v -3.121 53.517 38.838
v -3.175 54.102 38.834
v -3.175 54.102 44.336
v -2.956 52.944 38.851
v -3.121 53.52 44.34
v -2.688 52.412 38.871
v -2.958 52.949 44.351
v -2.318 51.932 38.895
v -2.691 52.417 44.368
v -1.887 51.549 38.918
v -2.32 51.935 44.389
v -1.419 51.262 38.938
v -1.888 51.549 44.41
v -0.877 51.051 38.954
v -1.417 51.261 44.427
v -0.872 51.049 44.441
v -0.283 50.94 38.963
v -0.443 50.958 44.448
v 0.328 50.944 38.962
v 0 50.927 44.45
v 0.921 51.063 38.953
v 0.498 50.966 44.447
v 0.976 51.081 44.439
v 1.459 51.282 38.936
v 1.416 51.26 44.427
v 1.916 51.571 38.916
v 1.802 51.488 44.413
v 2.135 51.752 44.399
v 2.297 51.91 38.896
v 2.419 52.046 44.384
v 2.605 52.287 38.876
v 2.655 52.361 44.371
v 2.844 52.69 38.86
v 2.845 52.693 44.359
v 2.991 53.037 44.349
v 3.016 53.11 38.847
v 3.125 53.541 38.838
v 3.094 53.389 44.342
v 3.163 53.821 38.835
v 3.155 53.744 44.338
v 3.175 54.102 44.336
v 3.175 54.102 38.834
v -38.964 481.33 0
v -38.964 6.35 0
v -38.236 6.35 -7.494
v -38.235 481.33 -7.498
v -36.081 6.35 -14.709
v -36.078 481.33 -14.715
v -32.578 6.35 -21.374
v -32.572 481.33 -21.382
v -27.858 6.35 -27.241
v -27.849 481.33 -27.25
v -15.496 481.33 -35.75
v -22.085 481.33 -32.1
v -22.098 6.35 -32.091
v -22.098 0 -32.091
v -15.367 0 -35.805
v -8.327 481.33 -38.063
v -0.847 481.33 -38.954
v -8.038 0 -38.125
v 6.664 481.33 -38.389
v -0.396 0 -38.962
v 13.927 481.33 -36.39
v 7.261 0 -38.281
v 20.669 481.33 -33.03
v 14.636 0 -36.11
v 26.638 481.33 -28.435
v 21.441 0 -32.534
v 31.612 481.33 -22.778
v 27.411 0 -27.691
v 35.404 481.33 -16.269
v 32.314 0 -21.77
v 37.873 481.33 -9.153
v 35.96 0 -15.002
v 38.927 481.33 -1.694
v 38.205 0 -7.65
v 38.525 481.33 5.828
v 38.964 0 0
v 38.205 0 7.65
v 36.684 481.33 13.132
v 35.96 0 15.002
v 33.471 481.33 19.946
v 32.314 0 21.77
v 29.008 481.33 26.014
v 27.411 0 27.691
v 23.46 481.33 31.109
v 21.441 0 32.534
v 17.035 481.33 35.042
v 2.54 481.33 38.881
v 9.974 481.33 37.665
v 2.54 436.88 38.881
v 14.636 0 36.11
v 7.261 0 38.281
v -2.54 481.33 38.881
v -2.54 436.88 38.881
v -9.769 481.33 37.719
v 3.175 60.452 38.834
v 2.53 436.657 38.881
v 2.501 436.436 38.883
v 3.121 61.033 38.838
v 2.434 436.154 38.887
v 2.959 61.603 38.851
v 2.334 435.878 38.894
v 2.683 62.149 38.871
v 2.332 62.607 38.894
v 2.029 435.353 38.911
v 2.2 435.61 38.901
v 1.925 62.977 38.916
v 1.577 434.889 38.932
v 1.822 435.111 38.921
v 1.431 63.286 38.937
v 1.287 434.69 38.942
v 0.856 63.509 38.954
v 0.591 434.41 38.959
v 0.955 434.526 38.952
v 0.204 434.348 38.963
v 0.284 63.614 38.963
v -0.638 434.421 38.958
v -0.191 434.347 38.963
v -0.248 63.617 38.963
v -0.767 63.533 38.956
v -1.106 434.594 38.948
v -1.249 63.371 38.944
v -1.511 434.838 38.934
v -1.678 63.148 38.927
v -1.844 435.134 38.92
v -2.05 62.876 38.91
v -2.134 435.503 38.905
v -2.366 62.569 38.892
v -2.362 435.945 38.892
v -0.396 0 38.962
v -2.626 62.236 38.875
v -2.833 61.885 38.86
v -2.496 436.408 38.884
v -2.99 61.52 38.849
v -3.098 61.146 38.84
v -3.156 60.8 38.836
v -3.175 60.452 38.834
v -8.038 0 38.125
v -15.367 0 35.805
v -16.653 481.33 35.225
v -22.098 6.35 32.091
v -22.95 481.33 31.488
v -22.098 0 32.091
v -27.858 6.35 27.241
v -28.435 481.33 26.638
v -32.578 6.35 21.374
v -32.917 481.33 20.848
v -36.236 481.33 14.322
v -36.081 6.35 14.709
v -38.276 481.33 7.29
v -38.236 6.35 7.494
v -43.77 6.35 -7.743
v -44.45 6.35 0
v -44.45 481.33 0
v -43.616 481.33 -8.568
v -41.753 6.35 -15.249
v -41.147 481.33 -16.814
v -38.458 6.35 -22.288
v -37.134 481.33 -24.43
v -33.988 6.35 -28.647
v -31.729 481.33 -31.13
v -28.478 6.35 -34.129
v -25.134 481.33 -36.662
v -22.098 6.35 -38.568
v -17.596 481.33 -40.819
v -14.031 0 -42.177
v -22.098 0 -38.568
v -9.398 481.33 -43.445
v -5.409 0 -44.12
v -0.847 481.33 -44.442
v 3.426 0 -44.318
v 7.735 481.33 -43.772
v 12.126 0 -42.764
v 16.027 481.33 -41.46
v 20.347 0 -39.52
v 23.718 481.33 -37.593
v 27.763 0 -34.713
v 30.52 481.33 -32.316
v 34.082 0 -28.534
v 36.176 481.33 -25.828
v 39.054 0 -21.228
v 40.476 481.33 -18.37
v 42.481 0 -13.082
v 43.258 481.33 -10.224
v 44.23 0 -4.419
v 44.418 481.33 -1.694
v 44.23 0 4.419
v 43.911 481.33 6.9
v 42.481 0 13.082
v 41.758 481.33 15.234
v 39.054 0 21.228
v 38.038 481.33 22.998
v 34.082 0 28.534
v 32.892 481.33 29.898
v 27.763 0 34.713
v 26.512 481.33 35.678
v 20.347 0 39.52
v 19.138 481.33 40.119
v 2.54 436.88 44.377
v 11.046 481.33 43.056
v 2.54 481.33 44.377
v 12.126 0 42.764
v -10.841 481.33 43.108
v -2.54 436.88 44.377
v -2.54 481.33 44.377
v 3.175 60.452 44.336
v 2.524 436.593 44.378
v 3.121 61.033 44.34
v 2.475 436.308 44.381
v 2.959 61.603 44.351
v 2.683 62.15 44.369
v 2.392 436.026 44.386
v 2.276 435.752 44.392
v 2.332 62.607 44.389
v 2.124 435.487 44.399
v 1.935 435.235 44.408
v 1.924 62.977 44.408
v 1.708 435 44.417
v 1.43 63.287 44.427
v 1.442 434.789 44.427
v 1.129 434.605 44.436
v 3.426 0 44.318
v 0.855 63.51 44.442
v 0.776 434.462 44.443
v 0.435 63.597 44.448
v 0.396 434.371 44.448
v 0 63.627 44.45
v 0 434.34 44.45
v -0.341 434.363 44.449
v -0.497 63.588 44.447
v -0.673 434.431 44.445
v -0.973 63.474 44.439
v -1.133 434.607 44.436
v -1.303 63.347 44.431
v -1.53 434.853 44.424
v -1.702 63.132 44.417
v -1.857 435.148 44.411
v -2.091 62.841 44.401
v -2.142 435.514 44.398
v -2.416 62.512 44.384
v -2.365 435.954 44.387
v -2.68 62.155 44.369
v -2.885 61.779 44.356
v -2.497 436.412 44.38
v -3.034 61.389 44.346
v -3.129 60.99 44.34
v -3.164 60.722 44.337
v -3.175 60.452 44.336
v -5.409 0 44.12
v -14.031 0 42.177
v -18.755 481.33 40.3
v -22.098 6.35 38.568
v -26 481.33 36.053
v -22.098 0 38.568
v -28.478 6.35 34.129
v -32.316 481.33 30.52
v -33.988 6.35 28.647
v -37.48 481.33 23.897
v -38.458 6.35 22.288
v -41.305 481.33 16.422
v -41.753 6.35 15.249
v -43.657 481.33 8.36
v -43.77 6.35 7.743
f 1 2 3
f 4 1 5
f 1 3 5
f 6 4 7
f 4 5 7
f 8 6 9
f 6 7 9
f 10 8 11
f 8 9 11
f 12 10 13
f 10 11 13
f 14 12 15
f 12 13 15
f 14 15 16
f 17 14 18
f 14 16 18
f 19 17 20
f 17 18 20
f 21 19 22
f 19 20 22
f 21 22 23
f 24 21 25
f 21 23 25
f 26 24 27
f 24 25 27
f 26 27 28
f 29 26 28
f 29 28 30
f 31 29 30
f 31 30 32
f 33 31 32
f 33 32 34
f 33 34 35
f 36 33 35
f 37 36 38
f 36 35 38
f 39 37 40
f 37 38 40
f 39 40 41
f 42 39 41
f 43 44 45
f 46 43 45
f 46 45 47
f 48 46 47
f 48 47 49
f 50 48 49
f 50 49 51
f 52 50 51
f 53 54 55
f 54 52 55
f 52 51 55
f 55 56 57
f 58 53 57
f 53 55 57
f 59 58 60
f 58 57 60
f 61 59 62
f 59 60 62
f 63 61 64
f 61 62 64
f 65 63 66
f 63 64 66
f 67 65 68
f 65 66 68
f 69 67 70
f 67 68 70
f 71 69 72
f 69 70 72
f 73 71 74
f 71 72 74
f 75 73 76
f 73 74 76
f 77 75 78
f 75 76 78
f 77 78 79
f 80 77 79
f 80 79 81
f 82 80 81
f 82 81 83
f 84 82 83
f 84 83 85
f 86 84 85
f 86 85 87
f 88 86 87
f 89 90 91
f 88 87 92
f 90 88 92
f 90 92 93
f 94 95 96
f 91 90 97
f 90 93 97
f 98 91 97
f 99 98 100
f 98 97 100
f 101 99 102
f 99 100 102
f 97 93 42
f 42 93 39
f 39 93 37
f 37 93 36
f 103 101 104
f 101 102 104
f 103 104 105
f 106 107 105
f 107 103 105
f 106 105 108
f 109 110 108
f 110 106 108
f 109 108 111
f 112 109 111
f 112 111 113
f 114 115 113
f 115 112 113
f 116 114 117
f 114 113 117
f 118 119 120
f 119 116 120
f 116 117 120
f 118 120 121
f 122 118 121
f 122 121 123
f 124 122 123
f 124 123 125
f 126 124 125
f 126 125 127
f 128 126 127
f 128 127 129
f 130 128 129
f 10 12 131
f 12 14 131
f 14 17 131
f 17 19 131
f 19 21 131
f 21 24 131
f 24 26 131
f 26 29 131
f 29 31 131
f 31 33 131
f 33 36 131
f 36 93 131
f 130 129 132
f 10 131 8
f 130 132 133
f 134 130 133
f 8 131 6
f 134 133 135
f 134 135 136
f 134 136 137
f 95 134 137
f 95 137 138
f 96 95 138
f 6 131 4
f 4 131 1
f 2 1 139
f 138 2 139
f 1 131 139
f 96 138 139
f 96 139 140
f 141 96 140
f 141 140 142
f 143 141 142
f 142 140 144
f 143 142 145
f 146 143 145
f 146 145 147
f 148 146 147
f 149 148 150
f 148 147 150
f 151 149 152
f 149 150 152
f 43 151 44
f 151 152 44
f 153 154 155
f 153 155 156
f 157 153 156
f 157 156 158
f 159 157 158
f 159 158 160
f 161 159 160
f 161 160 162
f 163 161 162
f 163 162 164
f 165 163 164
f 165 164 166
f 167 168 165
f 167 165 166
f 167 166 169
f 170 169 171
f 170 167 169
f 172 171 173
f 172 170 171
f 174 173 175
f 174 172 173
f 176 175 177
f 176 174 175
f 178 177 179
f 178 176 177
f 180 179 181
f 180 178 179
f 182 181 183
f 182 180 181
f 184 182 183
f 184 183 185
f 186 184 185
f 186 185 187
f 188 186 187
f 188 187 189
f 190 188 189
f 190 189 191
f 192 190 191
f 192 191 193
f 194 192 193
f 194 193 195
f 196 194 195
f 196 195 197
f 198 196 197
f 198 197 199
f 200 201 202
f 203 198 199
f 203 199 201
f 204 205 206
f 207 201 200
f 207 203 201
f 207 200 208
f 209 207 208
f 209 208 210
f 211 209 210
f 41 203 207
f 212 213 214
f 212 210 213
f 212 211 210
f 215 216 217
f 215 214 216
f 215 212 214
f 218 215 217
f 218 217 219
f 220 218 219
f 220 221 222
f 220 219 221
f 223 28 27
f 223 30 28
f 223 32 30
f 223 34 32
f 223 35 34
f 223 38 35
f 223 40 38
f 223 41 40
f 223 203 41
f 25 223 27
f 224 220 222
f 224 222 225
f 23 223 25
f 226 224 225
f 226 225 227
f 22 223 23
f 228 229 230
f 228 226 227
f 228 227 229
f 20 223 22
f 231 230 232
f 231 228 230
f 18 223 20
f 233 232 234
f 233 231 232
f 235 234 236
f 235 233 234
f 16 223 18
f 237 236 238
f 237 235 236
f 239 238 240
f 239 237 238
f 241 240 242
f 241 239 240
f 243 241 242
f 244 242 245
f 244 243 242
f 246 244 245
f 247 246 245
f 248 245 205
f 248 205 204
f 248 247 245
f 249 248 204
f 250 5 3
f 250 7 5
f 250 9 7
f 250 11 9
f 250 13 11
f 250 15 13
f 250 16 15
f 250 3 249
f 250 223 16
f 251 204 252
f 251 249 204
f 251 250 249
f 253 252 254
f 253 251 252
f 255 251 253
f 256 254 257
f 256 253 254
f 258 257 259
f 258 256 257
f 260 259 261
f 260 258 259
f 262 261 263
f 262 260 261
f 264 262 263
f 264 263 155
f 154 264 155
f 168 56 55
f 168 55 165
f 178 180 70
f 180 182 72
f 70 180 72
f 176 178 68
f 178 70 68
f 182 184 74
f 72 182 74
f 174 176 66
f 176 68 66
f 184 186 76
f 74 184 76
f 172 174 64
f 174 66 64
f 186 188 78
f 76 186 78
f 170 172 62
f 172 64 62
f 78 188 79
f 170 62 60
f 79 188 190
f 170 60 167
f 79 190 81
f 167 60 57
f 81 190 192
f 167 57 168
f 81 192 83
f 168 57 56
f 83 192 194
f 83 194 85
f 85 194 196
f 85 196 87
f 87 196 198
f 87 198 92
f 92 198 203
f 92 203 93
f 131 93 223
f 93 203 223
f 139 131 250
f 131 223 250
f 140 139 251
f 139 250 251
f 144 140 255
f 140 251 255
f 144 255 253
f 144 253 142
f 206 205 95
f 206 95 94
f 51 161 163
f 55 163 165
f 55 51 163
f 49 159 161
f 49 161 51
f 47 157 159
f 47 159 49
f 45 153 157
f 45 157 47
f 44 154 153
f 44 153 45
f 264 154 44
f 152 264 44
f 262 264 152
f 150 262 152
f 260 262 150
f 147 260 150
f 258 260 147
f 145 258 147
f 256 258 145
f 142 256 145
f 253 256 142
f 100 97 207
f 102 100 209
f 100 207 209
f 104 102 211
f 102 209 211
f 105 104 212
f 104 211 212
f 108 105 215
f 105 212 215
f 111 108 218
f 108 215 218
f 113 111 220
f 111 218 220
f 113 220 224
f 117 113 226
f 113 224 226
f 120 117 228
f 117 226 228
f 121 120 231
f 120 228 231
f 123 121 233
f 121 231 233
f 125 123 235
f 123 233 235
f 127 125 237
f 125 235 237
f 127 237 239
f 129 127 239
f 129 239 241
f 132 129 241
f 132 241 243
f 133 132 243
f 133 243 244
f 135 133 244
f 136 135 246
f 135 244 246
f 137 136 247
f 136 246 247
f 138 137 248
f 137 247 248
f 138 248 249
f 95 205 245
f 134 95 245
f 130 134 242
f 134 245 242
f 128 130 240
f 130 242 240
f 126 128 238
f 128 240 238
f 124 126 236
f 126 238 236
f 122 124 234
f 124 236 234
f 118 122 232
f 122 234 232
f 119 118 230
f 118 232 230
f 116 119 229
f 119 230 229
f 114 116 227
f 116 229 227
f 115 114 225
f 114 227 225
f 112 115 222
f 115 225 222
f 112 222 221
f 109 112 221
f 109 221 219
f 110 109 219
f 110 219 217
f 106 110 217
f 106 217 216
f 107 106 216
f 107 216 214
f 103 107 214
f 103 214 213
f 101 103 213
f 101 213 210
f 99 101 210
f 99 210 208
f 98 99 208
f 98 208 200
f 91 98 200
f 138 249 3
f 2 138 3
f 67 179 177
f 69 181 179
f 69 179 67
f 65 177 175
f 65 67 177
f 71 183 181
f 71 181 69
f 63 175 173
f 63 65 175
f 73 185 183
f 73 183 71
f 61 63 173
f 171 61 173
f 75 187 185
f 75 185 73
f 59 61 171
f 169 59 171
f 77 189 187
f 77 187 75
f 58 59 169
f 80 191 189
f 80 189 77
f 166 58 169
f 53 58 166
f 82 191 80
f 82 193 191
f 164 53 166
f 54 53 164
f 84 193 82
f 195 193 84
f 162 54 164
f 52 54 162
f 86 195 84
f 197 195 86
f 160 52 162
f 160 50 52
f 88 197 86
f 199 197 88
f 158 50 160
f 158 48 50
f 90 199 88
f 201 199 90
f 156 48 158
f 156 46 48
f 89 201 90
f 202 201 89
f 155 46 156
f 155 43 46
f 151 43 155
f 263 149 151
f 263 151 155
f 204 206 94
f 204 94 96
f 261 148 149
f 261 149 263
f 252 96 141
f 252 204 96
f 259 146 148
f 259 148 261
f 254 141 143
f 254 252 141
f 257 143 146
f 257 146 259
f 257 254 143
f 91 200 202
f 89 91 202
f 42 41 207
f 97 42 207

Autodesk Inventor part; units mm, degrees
ref_plane "YZ Plane" through (0, 0, 0) normal (1, 0, 0) x (0, 1, 0)
ref_plane "XZ Plane" through (0, 0, 0) normal (0, 1, 0) x (-1, 0, 0)
sketch "Sketch1" plane through (0, 0, 0) normal (0, 1, 0) x (-1, 0, 0)
  circle A0 centre (0, 0) radius 44.45
  circle A1 centre (0, 0) radius 38.9636
  dimension "d0" = 88.9
  dimension "d1" = 5.4864
extrude "Extrusion1" add sketch "Sketch1" along normal blind 481.33
ref_plane "Work Plane1" through (0, 0, 44.45) normal (0, 0, 1) x (1, 0, 0)
sketch "Sketch2" plane through (0, 0, 44.45) normal (0, 0, 1) x (1, 0, 0)
  arc A0 (-2.54, 436.88) -> (2.54, 436.88) centre (0, 436.88) ccw
  line L0 (44.45, 481.33) -> (-44.45, 481.33) projected
  line L1 (-2.54, 436.88) -> (-2.54, 481.33)
  line L2 (2.54, 436.88) -> (2.54, 481.33)
  point P0 (0, 0)
  dimension "d5" = 44.45
  dimension "d6" = 5.08
extrude "Extrusion2" cut sketch "Sketch2" against normal blind 25.4
sketch "Sketch4" plane through (0, 0, 44.45) normal (0, 0, 1) x (1, 0, 0)
  line L0 (0, 54.102) -> (0, 60.452) construction
  line L1 (3.175, 54.102) -> (3.175, 60.452)
  line L2 (-3.175, 60.452) -> (-3.175, 54.102)
  arc A0 (-3.175, 54.102) -> (3.175, 54.102) centre (0, 54.102) ccw
  arc A1 (3.175, 60.452) -> (-3.175, 60.452) centre (0, 60.452) ccw
  point P0 (0, 0)
  point P1 (0, 57.277)
  dimension "d18" = 6.35
  dimension "d19" = 6.35
  dimension "d20" = 54.102
extrude "Extrusion3" cut sketch "Sketch4" against normal blind 25.4
sketch "Sketch5" plane through (0, 0, 0) normal (0, -1, 0) x (1, 0, 0)
  circle A0 centre (0, 0) radius 44.45 projected
  line L0 (-22.098, 38.5679) -> (-22.098, -38.5679)
  point P0 (-44.45, 0)
  dimension "d23" = 22.352
extrude "Extrusion4" cut sketch "Sketch5" against normal blind 6.35 contours L0 A0 picked at (-24.6172, 11.037)
properties part number "mast_paper"
